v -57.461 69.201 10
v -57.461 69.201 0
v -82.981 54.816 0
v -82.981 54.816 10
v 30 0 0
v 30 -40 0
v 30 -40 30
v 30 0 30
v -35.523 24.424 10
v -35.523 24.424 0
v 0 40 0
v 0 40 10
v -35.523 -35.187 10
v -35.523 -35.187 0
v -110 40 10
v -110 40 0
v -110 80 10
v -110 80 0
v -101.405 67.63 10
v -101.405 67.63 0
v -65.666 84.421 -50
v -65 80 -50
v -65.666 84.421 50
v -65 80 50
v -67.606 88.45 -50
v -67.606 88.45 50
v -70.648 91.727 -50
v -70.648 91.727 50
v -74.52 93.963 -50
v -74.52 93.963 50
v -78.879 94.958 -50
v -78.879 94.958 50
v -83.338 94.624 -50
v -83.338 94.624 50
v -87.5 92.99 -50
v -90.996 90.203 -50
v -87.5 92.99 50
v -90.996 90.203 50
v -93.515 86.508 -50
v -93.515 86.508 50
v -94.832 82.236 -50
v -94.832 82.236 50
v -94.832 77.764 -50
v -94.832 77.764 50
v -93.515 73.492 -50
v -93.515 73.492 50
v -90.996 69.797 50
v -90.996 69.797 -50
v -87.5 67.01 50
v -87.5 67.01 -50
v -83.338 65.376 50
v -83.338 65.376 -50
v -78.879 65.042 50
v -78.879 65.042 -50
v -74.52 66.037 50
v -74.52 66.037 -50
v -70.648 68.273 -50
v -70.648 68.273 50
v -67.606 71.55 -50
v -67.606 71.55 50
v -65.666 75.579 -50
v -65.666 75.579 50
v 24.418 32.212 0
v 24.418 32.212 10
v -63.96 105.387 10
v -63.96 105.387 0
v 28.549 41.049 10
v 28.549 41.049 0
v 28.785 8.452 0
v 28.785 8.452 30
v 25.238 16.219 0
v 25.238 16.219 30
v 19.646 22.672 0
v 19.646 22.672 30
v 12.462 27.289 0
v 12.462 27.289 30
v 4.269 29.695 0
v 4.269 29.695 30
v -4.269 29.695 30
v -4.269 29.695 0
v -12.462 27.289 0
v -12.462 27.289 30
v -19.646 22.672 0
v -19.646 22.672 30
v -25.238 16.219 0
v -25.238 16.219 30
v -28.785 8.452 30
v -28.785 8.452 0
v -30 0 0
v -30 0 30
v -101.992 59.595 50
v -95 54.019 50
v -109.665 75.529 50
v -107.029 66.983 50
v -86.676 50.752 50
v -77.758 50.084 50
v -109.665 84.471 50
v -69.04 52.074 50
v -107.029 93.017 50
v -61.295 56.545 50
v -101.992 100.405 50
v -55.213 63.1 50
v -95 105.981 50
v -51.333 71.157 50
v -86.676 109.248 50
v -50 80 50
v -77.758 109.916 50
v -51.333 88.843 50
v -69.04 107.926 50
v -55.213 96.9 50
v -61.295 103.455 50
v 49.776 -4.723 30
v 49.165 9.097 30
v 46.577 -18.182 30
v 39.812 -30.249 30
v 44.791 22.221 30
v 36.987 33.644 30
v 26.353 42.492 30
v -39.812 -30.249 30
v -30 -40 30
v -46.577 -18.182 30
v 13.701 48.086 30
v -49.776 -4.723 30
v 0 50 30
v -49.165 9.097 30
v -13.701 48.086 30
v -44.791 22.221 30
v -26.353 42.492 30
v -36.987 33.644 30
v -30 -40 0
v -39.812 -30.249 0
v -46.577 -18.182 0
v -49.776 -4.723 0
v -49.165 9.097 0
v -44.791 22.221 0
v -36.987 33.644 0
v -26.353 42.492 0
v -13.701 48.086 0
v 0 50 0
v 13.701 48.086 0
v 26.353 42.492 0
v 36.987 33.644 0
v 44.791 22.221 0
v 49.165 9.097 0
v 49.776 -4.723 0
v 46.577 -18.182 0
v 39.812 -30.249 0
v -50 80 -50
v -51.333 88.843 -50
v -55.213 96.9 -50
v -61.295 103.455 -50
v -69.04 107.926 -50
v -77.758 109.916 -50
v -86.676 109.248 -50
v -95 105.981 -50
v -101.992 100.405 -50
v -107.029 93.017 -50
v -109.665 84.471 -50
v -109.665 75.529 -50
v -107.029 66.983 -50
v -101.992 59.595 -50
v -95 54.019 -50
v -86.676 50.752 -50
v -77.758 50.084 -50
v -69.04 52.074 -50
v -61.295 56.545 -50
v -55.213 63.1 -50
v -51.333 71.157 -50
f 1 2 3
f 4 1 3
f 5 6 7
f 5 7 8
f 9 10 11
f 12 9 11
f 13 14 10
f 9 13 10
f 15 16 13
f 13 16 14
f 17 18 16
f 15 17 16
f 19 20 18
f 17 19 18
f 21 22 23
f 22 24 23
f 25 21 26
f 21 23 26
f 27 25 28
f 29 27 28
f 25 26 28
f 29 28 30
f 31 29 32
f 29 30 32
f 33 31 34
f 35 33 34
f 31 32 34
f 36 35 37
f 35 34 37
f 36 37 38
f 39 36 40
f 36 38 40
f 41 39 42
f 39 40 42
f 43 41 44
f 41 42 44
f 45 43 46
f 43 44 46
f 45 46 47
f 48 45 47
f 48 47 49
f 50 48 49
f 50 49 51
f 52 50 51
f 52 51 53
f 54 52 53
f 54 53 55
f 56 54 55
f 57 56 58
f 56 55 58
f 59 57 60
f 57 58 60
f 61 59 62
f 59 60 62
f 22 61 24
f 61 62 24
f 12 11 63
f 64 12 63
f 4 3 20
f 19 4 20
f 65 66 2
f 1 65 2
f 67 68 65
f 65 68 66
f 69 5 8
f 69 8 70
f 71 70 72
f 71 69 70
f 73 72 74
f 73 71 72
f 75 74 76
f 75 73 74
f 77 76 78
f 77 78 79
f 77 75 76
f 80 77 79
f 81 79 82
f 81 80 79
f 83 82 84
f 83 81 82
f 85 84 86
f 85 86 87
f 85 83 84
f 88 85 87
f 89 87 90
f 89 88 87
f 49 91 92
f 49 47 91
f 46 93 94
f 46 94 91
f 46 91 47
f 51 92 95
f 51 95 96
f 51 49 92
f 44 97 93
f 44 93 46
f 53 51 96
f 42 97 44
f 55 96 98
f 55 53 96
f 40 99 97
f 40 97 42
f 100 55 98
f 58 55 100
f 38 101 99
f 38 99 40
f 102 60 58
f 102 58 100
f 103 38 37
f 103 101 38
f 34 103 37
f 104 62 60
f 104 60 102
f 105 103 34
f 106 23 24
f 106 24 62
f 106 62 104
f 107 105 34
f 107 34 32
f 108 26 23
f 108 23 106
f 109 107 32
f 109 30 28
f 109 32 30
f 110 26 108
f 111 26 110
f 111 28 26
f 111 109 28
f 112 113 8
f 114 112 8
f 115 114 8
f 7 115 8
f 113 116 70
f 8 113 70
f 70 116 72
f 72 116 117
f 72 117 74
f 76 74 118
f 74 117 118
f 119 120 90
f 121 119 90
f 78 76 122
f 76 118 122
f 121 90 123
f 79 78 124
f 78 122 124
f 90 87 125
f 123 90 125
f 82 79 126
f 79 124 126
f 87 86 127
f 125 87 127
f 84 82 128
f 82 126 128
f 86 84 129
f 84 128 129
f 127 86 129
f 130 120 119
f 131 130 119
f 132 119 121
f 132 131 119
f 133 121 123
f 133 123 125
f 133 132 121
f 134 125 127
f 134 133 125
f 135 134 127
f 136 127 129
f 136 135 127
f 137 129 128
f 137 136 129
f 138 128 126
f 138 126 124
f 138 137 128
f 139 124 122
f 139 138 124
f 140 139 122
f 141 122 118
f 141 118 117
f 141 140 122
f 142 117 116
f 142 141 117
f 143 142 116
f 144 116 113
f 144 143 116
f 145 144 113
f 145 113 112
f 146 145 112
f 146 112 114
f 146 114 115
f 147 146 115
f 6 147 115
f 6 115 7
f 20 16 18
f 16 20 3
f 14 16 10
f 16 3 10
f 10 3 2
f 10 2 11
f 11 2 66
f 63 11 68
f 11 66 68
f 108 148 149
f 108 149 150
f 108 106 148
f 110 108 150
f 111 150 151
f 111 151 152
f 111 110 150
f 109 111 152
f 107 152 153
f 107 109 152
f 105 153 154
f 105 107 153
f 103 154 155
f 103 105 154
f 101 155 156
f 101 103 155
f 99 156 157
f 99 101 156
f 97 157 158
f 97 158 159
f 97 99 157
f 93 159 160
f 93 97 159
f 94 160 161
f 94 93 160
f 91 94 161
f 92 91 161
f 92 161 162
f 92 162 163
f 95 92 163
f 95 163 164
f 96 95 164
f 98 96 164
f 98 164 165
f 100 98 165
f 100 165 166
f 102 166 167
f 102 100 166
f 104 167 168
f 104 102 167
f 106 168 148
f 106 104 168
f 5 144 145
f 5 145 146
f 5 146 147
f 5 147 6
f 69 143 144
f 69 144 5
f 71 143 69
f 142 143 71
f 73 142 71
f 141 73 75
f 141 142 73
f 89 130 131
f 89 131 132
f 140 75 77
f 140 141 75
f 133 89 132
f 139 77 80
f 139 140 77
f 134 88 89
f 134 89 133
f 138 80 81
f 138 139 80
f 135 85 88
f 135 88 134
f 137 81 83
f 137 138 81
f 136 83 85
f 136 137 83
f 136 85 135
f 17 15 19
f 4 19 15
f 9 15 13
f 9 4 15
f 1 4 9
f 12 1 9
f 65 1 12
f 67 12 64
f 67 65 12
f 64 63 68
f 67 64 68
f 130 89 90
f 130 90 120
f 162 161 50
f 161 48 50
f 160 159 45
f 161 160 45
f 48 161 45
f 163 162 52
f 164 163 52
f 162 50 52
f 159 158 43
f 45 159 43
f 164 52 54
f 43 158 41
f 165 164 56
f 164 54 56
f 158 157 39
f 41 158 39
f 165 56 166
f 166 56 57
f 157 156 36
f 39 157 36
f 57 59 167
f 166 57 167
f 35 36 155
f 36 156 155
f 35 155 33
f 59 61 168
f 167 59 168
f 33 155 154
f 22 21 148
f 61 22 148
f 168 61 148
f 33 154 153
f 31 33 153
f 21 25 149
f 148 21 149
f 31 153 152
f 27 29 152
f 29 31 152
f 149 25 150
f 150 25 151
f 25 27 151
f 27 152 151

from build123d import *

# Parameters (mm, degrees)
BOSS_EXTRUDE1_DEPTH = 30
SKETCH1_3_R         = 30
BOSS_EXTRUDE2_DEPTH = 50
SKETCH1_4_R         = 15
CUT_EXTRUDE1_DEPTH  = 50
BOSS_EXTRUDE4_DEPTH = 10


with BuildPart() as part:
    # Sketch1 → Boss-Extrude1 (new body)
    with BuildSketch(Plane.XY):
        with BuildLine():
            Line((-30, 0), (-30, -40))
            ThreePointArc((-30, -40), (0, 50), (30, -40))
            Line((30, -40), (30, 0))
            ThreePointArc((30, 0), (0, 30), (-30, 0))
        make_face()
    extrude(amount=BOSS_EXTRUDE1_DEPTH)


with BuildPart() as body_2:
    # Sketch1<3> → Boss-Extrude2 (new, symmetric)
    with BuildSketch(Plane.XY):
        with Locations((-80, 80)):
            Circle(SKETCH1_3_R)
    extrude(amount=BOSS_EXTRUDE2_DEPTH, both=True)

    # Sketch1<4> → Cut-Extrude1 (cut, symmetric)
    with BuildSketch(Plane.XY):
        with Locations((-80, 80)):
            Circle(SKETCH1_4_R)
    extrude(amount=CUT_EXTRUDE1_DEPTH, both=True, mode=Mode.SUBTRACT)


with BuildPart() as body_3:
    # Sketch2 → Boss-Extrude4 (new body)
    with BuildSketch(Plane.XY):
        Polygon((-110, 80), (-110, 40), (-35.522635393, -35.187247331), (-35.522635393, 24.424406647), (0, 40), (24.418101719, 32.212203323), (28.548527268, 41.048527268), (-63.960088523, 105.386639161), (-57.46096906, 69.201073422), (-82.980642429, 54.816403079), (-101.405140795, 67.630316976), align=None)
    extrude(amount=BOSS_EXTRUDE4_DEPTH)


solid = Compound([part.part, body_2.part, body_3.part])
